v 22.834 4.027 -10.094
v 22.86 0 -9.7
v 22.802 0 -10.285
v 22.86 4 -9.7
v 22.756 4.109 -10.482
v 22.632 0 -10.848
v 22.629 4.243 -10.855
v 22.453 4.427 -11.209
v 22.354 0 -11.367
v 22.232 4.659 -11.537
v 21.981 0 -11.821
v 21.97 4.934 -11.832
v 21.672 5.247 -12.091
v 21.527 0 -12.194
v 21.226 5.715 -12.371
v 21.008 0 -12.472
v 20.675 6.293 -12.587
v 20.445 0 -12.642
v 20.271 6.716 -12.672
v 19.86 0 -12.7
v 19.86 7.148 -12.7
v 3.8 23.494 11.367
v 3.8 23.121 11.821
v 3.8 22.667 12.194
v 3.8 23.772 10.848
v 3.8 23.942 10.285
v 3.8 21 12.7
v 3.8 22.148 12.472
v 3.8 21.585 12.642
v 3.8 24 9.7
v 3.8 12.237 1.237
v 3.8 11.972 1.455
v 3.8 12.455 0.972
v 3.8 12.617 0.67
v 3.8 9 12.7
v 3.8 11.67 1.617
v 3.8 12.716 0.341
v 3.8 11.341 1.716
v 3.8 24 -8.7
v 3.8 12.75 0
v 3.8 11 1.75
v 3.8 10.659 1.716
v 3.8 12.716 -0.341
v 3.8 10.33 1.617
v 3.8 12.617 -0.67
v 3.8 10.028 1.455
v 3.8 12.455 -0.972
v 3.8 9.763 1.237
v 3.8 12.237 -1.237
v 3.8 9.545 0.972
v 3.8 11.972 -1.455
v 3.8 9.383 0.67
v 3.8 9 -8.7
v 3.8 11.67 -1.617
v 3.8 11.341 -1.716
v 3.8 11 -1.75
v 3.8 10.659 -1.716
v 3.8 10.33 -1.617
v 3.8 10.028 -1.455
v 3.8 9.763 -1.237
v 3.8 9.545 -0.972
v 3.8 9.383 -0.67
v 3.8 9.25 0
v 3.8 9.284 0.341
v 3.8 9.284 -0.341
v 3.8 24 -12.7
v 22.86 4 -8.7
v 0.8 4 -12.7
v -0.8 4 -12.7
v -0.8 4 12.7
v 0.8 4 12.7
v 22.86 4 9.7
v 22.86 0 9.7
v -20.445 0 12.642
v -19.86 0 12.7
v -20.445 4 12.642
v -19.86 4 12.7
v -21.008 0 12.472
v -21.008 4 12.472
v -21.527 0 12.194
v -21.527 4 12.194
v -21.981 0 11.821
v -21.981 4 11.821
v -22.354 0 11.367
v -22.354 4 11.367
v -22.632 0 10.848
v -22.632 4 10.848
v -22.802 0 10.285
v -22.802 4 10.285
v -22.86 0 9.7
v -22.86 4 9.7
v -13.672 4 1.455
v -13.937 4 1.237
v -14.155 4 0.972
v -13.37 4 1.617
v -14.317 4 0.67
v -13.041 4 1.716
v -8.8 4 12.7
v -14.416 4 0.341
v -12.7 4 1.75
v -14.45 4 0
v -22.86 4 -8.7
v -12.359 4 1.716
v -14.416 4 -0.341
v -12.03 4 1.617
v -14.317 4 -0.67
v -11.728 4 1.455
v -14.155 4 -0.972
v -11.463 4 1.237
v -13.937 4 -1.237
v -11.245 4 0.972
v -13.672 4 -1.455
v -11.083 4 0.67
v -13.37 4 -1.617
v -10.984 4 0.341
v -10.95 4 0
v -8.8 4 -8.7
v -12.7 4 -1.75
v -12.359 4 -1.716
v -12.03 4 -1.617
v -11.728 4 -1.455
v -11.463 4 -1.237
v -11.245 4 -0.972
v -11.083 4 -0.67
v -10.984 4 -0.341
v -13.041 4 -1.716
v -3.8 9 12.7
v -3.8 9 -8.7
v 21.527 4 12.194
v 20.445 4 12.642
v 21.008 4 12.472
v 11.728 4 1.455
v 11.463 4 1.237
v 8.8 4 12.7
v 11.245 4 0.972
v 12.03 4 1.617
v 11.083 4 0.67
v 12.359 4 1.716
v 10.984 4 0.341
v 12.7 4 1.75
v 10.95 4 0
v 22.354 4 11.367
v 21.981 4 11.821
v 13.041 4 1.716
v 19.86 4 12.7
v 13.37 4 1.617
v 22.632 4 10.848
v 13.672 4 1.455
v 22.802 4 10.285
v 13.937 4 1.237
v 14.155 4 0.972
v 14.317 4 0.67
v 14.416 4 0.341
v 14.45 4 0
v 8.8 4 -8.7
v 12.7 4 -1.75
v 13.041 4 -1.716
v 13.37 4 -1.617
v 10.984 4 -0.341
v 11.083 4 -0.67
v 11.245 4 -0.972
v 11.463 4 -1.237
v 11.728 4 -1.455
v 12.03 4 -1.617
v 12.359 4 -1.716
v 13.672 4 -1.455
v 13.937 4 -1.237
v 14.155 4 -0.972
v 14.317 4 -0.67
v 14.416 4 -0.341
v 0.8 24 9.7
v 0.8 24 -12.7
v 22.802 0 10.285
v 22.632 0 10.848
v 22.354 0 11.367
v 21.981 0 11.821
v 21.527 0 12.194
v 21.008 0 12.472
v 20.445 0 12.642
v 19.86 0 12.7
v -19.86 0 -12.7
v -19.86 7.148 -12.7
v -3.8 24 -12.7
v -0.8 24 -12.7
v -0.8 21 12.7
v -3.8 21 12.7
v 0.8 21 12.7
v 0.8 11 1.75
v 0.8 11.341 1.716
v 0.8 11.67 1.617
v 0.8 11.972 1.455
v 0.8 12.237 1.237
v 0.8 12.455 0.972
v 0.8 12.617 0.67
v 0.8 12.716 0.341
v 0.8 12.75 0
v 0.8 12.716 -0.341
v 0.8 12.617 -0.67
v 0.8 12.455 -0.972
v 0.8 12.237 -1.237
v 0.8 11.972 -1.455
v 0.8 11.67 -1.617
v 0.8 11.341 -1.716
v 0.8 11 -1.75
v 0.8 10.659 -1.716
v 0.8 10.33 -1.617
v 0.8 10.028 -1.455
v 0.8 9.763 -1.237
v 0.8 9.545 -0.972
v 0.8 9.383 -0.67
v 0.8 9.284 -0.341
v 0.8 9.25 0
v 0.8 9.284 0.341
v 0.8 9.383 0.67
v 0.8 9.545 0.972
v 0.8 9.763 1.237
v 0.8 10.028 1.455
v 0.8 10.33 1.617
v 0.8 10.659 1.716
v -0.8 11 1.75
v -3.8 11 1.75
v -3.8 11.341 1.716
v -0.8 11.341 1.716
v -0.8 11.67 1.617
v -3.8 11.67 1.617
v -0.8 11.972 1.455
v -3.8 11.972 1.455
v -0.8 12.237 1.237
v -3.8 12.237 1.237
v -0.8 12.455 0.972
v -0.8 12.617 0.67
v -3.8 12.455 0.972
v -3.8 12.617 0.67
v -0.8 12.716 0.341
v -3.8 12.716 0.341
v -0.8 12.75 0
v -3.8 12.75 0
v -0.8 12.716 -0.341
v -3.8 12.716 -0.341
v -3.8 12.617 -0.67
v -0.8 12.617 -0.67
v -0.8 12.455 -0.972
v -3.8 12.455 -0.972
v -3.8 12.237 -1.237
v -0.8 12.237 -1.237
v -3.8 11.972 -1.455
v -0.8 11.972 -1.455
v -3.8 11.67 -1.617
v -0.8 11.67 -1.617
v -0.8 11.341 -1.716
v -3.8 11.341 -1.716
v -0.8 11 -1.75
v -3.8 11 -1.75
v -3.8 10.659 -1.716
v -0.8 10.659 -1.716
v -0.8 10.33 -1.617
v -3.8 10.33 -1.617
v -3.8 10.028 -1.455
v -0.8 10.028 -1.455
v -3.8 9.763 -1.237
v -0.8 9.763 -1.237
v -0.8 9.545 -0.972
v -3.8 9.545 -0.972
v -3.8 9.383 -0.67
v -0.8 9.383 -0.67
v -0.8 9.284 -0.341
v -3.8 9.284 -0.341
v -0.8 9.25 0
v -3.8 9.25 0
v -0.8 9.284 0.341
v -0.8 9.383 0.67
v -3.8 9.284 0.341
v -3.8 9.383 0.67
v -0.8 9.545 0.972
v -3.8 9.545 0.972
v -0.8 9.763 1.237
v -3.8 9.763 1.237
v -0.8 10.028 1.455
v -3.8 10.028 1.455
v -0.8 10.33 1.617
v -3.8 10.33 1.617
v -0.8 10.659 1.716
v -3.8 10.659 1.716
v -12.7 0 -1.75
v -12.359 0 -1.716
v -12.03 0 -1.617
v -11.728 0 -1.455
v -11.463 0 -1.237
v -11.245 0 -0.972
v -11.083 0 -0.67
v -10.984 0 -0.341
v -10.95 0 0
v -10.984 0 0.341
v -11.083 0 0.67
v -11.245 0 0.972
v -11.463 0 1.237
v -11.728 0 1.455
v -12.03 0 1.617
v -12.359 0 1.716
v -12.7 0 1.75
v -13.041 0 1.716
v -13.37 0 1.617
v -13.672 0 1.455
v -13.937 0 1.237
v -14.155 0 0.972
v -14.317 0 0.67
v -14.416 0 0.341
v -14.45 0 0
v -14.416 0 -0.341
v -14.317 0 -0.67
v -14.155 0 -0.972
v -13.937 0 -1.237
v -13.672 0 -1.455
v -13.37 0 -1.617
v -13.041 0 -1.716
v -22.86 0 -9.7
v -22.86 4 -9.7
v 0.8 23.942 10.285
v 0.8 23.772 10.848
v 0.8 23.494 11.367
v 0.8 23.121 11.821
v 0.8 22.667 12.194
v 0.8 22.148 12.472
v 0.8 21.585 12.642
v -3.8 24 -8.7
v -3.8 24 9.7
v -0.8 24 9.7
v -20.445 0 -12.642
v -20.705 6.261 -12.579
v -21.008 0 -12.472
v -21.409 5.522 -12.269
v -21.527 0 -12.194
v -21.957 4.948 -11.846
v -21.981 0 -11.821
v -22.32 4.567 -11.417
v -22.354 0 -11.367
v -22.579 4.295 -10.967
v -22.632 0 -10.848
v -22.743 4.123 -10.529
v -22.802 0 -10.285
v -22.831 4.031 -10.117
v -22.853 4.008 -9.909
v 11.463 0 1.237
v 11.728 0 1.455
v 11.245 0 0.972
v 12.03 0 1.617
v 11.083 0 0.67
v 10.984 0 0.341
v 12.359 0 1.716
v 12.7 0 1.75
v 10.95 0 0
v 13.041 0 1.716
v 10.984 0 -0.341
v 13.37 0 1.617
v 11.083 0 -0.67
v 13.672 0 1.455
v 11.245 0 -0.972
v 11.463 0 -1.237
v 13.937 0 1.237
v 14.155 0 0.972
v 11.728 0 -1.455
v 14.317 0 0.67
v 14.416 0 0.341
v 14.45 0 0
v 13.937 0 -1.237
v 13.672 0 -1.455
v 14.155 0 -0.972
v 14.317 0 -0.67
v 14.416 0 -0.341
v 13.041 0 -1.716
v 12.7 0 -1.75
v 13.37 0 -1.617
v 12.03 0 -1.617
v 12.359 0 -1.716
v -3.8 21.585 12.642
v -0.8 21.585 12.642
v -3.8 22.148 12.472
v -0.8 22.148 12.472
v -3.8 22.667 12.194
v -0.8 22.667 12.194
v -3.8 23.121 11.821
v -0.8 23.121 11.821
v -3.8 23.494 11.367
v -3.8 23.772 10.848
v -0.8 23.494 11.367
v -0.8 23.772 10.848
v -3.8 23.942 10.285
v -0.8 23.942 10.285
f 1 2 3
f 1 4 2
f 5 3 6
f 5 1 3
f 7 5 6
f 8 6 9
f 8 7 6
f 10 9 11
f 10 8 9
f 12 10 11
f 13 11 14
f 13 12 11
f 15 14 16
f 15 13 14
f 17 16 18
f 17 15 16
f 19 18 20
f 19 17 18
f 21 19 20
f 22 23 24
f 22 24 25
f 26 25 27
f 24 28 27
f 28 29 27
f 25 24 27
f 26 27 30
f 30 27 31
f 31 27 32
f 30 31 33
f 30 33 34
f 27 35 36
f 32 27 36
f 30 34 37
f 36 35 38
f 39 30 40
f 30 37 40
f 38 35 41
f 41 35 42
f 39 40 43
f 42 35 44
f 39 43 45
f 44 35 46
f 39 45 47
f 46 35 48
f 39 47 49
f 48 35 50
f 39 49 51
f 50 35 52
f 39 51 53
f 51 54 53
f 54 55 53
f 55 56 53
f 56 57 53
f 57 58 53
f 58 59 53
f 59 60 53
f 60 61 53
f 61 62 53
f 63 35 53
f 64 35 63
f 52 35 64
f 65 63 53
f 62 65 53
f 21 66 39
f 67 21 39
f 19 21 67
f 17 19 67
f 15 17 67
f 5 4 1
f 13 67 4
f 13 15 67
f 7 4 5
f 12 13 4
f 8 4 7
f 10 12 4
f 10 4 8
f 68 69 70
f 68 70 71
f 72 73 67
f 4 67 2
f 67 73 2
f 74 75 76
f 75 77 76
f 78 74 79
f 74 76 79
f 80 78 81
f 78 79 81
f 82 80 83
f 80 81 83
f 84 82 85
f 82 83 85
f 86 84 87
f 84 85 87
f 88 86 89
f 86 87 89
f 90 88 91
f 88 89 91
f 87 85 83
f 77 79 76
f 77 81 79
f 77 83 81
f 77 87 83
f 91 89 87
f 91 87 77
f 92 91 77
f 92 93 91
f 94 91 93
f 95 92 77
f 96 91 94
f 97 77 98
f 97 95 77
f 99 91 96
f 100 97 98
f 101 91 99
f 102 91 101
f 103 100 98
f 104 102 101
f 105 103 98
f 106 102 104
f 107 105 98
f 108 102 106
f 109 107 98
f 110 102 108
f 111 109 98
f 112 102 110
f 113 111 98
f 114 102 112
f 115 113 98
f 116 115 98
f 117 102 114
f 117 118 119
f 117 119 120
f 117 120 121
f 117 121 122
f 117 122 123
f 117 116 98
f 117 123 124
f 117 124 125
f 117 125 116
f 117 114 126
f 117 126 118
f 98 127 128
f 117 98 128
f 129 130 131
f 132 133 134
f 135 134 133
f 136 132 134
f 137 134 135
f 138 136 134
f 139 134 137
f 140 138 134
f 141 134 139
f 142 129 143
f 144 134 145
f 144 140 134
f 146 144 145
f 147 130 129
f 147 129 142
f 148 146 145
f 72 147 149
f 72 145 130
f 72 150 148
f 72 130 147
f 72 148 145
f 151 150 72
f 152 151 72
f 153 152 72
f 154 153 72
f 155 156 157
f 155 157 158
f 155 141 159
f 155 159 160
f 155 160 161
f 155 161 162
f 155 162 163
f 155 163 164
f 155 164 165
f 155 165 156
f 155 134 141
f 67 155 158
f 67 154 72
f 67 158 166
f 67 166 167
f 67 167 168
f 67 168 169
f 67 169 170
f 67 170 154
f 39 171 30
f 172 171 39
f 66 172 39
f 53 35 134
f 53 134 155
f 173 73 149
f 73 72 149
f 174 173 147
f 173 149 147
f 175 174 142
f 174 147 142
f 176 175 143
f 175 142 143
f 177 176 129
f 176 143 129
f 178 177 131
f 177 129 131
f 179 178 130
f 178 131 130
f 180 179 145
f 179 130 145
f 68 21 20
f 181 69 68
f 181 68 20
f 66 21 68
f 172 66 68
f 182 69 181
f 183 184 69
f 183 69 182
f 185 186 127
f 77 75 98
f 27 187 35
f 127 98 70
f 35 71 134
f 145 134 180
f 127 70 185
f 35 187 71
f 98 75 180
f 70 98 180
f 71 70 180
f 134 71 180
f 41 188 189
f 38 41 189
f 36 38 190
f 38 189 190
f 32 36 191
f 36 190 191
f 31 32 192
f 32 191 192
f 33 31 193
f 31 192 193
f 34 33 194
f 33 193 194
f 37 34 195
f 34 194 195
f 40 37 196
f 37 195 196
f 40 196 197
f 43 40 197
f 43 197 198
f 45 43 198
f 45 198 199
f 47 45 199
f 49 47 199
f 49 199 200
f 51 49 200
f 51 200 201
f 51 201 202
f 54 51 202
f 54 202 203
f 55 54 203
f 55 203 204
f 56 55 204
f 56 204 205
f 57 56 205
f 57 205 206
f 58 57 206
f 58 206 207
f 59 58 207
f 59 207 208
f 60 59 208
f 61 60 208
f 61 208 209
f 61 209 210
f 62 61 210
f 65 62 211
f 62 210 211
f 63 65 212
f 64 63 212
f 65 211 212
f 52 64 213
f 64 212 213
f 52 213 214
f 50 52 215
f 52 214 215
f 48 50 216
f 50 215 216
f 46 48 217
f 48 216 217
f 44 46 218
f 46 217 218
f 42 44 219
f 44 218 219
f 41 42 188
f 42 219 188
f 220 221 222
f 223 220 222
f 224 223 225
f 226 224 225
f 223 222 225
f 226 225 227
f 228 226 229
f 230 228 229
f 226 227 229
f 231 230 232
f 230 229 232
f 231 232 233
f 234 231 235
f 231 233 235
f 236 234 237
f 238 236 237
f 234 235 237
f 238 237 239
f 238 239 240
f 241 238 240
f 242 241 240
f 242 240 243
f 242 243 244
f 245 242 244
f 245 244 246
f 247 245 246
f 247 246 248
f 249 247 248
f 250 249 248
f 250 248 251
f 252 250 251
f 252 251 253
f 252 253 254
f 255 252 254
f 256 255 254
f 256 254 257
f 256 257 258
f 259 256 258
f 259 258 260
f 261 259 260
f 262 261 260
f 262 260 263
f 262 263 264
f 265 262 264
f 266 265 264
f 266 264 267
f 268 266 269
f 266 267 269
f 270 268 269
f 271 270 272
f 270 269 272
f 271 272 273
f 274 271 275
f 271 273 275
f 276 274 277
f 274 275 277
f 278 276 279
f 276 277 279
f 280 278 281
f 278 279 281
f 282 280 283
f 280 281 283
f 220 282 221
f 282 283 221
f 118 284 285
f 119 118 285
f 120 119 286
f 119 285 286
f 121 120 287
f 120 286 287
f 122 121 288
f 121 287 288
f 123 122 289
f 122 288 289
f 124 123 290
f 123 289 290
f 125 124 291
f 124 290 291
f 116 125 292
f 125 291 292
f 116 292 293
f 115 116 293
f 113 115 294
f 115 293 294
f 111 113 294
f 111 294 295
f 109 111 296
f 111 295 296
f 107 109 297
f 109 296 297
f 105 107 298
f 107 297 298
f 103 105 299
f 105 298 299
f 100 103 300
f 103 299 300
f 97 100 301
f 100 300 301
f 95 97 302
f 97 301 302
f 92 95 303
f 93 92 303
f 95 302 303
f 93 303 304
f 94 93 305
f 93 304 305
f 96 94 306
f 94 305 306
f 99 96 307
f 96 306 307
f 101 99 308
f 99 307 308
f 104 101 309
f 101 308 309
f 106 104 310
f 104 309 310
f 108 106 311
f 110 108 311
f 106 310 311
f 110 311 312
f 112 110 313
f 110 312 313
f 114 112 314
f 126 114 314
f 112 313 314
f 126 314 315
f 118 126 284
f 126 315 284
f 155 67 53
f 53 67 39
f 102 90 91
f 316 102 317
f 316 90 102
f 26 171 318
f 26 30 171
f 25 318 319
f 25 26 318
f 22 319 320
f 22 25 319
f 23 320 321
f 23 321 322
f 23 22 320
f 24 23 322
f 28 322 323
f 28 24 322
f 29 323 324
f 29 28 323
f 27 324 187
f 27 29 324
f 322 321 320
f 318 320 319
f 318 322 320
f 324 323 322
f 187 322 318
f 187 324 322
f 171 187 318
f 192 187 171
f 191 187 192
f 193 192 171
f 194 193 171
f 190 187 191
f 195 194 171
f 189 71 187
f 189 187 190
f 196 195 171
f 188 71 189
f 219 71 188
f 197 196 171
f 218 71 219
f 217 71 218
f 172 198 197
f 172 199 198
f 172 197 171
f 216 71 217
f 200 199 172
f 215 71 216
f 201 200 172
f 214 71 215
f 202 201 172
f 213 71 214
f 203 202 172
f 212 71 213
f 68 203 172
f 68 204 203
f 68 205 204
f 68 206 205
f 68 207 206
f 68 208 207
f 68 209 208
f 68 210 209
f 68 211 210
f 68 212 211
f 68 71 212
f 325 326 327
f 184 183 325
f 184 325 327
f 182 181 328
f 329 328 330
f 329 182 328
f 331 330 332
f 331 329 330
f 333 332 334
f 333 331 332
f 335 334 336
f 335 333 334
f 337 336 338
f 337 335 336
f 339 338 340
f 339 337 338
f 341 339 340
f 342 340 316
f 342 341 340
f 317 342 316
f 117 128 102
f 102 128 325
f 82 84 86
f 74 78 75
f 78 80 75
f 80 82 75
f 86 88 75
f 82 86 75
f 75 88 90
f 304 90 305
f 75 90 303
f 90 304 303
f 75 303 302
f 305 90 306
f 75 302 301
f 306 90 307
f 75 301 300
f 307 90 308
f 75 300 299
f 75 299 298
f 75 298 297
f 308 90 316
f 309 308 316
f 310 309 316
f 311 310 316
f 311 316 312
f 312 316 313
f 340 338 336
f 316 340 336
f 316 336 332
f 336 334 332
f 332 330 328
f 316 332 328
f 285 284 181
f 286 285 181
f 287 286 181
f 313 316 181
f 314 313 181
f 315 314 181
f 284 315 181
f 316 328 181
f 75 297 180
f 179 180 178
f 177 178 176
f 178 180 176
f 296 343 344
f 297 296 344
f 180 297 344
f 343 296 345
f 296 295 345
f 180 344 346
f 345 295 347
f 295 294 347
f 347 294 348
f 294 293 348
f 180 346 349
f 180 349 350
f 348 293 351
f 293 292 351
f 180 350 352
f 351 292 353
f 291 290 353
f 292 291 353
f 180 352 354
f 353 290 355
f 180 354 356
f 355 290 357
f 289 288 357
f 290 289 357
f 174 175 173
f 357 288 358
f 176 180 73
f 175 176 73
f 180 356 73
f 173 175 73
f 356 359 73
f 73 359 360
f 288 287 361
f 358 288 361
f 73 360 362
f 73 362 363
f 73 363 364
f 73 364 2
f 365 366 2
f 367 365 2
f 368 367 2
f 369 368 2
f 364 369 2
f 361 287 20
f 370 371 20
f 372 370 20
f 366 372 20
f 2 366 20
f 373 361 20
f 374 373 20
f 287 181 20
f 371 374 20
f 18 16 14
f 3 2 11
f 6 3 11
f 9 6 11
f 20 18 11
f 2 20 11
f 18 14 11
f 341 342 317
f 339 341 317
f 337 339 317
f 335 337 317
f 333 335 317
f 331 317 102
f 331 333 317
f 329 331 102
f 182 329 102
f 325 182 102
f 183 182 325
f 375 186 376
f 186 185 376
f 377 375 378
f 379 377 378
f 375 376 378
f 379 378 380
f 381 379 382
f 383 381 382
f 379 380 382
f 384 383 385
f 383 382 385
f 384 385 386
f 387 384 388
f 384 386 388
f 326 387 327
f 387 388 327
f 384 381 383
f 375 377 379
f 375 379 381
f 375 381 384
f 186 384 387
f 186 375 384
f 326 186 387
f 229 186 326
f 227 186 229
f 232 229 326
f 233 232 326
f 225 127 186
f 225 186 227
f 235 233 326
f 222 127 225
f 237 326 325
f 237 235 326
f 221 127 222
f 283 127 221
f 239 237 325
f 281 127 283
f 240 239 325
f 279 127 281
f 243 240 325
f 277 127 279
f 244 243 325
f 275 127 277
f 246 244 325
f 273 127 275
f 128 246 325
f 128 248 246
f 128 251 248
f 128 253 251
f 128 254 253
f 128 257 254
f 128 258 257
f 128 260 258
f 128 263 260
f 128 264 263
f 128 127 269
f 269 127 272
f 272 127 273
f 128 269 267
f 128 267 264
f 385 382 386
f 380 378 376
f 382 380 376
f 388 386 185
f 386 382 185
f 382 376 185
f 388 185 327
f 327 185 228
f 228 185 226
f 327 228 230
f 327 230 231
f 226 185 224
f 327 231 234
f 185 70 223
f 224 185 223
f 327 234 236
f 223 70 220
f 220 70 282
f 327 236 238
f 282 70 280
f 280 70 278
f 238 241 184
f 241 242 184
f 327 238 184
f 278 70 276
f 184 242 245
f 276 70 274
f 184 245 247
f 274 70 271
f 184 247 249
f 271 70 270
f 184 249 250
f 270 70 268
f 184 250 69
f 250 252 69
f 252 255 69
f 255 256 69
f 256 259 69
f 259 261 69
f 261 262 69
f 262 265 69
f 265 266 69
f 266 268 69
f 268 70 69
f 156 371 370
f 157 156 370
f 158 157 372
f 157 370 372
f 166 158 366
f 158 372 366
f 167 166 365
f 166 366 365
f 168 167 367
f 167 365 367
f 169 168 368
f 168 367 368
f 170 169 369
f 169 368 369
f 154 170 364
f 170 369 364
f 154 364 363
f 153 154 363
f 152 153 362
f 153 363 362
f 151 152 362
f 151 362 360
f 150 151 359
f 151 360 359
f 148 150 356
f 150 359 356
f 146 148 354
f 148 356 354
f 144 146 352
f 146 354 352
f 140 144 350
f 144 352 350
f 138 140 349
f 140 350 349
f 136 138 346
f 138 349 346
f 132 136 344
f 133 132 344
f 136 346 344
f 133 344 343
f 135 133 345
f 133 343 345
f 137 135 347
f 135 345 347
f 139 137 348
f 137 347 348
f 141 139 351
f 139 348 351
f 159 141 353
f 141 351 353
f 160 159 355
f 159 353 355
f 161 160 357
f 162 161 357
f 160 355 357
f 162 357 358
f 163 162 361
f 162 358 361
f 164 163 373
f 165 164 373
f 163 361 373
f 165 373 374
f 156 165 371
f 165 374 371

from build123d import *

# Parameters (mm, degrees)
SKETCH1_W           = 45.72
SKETCH1_H           = 25.4
BOSS_EXTRUDE1_DEPTH = 4
SKETCH2_W           = 3
SKETCH2_H           = 25.4
BOSS_EXTRUDE2_DEPTH = 20
CHAMFER1_SIZE       = 5
BOSS_EXTRUDE3_DEPTH = 4
SKETCH4_R           = 1.75
CUT_EXTRUDE1_DEPTH  = 4
SKETCH5_R           = 1.75
CUT_EXTRUDE2_DEPTH  = 14
FILLET1_R           = 3


with BuildPart() as part:
    # Sketch1 → Boss-Extrude1 (new body)
    with BuildSketch(Plane(origin=(0, 0, 0), x_dir=(1, 0, 0), z_dir=(0, 1, 0))):
        Rectangle(SKETCH1_W, SKETCH1_H)
    extrude(amount=BOSS_EXTRUDE1_DEPTH)

    # Sketch2 → Boss-Extrude2 (add)
    with BuildSketch(Plane(origin=(0, 4, 0), x_dir=(1, 0, 0), z_dir=(0, 1, 0))):
        with Locations((-2.3, 0)):
            Rectangle(SKETCH2_W, SKETCH2_H)
        with Locations((2.3, 0)):
            Rectangle(SKETCH2_W, SKETCH2_H)
    extrude(amount=BOSS_EXTRUDE2_DEPTH)

    # Chamfer1
    chamfer1_edges = [part.edges().sort_by_distance(p)[0] for p in [
        (-3.8, 4, 0),
        (3.8, 4, 0),
    ]]
    chamfer(chamfer1_edges, length=CHAMFER1_SIZE)

    # Sketch3 → Boss-Extrude3 (add)
    with BuildSketch(Plane(origin=(0, 0, -12.7), x_dir=(-1, 0, 0), z_dir=(0, 0, -1))):
        Polygon((-3.8, 24), (-22.86, 4), (-3.8, 4), align=None)
        Polygon((3.8, 24), (3.8, 4), (22.86, 4), align=None)
    extrude(amount=-BOSS_EXTRUDE3_DEPTH)

    # Sketch4 → Cut-Extrude1 (cut)
    with BuildSketch(Plane.XZ):
        with Locations(Location((-12.7, 0, 0), (0, 0, 270))):
            Circle(SKETCH4_R)
        with Locations(Location((12.7, 0, 0), (0, 0, 270))):
            Circle(SKETCH4_R)
    extrude(amount=-CUT_EXTRUDE1_DEPTH, mode=Mode.SUBTRACT)

    # Sketch5 → Cut-Extrude2 (cut)
    with BuildSketch(Plane.ZY.offset(3.8)):
        with Locations((0, 11)):
            Circle(SKETCH5_R)
    extrude(amount=-CUT_EXTRUDE2_DEPTH, mode=Mode.SUBTRACT)

    # Fillet1
    fillet1_edges = [part.edges().sort_by_distance(p)[0] for p in [
        (-2.3, 24, 12.7),
        (2.3, 24, 12.7),
        (22.86, 2, 12.7),
        (-22.86, 2, 12.7),
        (-22.86, 2, -12.7),
        (22.86, 2, -12.7),
    ]]
    fillet(fillet1_edges, radius=FILLET1_R)


solid = part.part
